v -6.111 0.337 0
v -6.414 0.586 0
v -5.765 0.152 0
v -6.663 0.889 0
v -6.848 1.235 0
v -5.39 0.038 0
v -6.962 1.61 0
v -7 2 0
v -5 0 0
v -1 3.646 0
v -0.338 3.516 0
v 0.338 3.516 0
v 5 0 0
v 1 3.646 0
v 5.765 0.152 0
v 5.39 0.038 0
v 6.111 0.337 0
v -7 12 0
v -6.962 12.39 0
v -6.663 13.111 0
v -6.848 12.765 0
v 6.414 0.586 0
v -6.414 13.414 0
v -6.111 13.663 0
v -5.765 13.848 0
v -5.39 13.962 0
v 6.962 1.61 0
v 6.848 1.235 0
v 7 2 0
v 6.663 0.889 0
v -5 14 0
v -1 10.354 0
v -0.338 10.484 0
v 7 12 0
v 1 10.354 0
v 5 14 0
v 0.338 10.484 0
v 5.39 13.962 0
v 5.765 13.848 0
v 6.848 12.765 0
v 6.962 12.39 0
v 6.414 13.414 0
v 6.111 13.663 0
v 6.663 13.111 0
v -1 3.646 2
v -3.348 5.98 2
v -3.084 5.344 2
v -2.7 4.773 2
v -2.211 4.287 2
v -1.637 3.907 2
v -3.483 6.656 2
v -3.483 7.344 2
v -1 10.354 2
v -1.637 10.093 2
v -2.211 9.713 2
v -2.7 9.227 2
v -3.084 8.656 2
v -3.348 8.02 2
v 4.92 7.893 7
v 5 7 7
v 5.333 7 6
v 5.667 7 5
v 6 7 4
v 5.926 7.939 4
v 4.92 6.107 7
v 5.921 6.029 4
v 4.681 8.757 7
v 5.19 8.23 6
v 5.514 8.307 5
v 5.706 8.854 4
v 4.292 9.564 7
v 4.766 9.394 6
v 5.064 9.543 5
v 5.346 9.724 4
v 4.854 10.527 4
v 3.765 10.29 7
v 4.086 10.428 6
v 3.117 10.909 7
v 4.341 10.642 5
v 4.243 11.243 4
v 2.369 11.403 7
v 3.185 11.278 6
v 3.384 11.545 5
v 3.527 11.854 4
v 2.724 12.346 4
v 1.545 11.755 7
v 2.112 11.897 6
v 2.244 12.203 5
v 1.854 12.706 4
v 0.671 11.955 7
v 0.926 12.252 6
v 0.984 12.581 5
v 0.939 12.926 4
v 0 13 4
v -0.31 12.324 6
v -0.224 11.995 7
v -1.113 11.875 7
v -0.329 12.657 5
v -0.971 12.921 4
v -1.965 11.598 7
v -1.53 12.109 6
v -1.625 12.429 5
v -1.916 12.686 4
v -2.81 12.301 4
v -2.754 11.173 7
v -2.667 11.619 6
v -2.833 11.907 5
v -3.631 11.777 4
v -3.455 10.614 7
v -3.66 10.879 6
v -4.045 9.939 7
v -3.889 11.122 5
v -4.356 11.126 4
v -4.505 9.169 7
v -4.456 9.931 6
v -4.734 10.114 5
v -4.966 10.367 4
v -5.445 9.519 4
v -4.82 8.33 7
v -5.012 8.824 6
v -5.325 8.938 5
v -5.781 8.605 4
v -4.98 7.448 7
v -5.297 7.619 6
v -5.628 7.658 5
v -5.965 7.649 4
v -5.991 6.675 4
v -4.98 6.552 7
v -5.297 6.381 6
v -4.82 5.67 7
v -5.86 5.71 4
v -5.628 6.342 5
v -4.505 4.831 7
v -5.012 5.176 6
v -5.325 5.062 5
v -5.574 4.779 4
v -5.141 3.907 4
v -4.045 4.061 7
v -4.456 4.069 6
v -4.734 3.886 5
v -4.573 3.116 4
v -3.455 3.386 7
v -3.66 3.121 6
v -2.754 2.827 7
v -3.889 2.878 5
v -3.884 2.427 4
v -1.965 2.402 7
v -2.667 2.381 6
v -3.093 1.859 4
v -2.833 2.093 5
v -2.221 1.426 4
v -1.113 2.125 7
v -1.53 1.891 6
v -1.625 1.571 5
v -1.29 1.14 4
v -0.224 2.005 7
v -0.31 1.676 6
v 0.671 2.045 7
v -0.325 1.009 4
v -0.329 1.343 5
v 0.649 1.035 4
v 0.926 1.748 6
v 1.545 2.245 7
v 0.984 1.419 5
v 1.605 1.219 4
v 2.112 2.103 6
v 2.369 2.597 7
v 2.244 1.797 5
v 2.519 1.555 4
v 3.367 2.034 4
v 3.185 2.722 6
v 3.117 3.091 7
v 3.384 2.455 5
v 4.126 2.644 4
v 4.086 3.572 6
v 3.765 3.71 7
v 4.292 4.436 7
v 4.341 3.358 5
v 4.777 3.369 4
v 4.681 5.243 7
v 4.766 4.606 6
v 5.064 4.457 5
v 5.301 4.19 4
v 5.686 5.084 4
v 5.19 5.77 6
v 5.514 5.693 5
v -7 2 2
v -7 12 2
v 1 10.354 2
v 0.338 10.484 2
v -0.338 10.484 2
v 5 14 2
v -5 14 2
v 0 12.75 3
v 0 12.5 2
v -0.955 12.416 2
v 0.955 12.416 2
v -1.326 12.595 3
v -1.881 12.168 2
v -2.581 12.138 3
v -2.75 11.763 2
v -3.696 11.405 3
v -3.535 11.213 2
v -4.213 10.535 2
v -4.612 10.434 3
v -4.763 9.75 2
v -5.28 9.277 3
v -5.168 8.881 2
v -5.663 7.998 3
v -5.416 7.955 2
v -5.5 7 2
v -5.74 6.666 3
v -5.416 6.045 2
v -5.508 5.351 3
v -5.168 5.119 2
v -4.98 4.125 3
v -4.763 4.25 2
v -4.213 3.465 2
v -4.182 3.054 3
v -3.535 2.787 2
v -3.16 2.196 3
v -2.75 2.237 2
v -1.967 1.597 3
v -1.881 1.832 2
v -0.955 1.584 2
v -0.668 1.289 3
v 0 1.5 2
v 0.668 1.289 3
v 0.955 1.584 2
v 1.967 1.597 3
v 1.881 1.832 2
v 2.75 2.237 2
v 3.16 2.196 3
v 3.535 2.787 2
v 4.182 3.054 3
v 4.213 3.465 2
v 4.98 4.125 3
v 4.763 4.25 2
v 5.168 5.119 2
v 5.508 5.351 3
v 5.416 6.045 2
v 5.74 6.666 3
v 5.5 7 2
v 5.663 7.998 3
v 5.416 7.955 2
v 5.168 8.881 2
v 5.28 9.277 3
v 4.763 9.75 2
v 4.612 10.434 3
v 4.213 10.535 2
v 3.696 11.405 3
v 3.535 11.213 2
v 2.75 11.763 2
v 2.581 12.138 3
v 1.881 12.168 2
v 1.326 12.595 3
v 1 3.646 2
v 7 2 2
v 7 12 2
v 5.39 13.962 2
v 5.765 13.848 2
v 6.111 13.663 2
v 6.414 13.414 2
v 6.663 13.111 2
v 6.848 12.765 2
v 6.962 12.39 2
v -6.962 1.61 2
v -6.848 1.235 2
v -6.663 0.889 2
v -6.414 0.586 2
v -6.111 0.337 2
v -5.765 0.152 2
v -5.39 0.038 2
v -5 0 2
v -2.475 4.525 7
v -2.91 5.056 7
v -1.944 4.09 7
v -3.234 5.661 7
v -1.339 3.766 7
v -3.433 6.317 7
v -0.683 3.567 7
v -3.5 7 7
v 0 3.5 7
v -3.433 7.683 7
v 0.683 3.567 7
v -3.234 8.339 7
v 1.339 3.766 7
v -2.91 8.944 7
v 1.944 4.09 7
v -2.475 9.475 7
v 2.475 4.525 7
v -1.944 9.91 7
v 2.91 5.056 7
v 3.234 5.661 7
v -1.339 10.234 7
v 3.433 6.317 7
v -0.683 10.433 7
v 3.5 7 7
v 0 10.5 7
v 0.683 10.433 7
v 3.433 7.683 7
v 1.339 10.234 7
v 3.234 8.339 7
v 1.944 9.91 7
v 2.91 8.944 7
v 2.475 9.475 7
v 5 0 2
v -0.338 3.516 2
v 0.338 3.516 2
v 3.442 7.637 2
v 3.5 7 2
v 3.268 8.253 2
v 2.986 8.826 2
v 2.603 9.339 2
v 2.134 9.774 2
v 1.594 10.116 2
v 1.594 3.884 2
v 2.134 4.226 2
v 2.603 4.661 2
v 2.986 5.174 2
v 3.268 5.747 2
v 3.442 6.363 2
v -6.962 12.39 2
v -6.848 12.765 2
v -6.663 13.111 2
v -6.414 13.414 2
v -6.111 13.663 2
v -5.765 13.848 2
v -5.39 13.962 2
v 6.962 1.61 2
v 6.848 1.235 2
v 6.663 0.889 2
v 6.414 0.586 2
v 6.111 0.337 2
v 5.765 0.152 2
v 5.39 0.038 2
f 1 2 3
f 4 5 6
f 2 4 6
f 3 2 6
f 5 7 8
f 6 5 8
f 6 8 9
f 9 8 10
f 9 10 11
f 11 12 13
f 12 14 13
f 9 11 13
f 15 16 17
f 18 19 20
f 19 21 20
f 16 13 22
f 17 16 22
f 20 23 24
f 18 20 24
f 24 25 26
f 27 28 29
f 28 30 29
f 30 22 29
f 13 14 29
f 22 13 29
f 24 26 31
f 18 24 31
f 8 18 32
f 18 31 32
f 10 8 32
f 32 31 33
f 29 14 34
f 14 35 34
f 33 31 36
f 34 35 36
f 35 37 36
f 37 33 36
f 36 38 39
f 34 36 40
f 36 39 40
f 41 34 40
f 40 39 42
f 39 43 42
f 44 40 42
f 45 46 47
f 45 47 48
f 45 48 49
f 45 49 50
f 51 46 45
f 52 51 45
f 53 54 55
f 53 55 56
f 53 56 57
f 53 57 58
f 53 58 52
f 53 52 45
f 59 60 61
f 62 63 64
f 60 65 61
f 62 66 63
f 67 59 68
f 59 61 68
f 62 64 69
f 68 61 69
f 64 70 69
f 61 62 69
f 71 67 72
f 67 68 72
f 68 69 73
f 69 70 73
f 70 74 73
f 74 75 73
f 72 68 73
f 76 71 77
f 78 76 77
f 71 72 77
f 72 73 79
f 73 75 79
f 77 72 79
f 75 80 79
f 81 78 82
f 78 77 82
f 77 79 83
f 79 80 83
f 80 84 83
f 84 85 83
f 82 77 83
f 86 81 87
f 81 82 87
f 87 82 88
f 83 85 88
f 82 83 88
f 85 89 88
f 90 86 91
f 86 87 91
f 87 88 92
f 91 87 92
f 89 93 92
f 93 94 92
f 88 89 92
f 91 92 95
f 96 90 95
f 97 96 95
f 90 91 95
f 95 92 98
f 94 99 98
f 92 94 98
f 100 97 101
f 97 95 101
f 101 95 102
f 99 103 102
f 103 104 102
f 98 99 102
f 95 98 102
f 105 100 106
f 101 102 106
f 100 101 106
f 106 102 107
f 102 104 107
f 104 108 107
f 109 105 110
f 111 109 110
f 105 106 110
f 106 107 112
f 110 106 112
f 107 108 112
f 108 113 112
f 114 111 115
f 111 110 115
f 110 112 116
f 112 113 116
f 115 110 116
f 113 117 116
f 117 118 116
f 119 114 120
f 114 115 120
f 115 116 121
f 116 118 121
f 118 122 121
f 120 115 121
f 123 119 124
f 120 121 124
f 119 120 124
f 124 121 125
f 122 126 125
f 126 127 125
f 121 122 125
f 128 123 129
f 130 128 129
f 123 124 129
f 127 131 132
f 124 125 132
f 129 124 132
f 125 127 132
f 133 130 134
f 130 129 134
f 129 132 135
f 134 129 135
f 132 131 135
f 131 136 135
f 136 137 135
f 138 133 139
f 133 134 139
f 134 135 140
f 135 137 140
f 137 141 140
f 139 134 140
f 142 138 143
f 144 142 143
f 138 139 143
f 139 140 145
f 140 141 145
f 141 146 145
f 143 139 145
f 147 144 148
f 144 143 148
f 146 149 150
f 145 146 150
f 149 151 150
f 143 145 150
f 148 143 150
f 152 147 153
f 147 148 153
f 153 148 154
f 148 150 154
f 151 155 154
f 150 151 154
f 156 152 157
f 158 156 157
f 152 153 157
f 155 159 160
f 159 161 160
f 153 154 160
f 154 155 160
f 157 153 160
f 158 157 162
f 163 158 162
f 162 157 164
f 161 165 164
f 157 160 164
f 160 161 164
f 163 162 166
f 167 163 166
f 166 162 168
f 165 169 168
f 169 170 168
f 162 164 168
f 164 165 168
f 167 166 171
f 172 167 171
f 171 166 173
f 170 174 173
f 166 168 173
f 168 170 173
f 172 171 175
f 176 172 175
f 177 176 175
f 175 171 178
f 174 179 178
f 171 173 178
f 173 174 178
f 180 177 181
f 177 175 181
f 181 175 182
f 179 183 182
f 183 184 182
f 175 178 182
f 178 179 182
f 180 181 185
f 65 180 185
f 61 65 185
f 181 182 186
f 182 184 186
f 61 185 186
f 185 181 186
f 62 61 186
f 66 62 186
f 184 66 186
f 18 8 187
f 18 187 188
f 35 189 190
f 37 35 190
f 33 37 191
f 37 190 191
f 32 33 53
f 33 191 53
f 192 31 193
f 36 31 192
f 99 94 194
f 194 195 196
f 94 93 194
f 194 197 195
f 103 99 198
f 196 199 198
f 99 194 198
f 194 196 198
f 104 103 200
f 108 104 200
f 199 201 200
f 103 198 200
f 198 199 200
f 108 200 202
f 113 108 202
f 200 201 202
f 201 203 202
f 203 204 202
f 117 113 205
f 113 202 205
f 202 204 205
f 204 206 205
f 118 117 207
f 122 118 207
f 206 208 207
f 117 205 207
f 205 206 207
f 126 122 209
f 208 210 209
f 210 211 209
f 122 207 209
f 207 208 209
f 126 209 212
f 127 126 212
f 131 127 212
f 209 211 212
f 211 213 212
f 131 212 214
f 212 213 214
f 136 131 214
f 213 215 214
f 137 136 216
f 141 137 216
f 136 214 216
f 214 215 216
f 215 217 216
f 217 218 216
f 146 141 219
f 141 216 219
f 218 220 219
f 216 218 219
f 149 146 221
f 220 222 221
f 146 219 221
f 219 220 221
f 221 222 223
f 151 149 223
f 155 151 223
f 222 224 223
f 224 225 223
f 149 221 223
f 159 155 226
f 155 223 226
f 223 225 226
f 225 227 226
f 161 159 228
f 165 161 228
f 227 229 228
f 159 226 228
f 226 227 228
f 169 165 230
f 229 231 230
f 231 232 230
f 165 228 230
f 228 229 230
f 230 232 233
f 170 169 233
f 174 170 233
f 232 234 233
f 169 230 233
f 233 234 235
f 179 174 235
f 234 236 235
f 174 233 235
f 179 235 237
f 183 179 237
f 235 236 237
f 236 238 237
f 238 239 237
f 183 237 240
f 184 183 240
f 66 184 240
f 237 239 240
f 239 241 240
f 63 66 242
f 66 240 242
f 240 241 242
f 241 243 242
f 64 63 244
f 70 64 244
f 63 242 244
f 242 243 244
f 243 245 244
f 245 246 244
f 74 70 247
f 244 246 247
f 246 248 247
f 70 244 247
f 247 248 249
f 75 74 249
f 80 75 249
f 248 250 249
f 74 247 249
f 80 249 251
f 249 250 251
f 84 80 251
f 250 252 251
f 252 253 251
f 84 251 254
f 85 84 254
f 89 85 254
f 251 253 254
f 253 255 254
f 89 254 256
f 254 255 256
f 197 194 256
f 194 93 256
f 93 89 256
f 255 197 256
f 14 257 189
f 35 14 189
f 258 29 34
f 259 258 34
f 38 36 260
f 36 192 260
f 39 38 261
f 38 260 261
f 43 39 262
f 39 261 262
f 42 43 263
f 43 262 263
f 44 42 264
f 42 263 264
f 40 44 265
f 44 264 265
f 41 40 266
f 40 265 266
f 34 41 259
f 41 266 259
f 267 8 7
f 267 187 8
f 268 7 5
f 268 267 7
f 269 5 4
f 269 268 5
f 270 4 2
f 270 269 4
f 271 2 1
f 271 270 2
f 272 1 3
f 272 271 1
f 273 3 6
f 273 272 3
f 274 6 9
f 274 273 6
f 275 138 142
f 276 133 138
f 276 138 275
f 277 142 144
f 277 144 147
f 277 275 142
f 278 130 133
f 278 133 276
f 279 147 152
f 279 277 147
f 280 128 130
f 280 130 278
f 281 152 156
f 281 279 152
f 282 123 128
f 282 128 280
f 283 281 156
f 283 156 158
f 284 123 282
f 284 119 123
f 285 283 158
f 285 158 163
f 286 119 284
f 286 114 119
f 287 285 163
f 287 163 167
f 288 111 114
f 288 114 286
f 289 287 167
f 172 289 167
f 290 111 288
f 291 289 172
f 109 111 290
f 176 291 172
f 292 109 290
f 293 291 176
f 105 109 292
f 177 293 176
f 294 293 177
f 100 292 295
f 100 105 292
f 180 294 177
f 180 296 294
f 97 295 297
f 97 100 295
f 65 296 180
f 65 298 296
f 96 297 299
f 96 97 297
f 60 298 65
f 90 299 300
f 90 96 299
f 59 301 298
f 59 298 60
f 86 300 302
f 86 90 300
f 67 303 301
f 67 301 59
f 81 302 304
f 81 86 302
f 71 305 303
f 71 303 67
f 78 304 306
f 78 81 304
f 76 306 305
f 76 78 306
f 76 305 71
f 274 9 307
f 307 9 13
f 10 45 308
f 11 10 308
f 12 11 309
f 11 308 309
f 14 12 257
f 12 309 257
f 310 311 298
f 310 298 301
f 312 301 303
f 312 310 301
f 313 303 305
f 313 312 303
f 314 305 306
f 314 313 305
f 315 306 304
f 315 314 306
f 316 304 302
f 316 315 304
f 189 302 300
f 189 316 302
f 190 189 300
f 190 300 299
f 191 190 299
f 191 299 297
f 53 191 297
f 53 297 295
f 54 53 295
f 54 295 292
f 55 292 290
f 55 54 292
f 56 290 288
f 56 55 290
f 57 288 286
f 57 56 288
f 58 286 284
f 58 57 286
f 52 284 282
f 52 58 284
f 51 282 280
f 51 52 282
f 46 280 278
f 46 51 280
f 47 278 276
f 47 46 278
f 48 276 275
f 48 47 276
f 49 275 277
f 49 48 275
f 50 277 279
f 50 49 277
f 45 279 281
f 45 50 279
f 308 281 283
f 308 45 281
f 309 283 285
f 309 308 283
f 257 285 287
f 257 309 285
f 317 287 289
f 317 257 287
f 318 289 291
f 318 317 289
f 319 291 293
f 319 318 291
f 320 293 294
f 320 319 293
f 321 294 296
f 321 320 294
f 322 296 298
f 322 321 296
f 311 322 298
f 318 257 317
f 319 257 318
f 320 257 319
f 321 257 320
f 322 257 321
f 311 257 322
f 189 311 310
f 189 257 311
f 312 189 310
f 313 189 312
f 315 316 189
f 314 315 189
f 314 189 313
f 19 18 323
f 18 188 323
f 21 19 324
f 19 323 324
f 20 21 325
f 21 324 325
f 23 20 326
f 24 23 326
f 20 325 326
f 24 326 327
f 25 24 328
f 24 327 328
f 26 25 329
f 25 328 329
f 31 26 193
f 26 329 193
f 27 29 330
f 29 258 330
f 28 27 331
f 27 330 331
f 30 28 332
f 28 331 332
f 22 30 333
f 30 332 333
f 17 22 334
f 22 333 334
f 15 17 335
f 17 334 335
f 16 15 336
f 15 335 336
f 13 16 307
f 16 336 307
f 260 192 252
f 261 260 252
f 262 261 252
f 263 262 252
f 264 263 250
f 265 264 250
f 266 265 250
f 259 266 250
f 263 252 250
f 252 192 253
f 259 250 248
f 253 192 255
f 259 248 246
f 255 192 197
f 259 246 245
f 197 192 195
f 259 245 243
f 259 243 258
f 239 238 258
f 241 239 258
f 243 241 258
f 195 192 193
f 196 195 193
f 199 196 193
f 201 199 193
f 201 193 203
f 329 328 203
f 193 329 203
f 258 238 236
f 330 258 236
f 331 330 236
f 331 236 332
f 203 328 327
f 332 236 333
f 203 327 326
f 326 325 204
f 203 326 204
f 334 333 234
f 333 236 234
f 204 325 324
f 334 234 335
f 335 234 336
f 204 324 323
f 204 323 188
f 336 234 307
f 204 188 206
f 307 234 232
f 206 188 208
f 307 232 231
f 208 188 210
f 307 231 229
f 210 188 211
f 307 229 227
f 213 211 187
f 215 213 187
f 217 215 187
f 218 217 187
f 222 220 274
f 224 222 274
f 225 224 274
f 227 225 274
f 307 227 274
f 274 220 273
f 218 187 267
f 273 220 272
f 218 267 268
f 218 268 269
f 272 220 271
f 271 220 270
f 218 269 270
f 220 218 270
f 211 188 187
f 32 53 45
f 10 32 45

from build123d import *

# Parameters (mm, degrees)
F0_W     = 14
F0_H     = 14
F1_DEPTH = 2
F2_R     = 6
F2_R_2   = 3.5
F3_DEPTH = 5
F4_SIZE2 = 3
F4_SIZE  = 1
F9_DEPTH = 2
F10_R    = 2


with BuildPart() as f1:
    # F0 (on Top) → F1 (new body)
    with BuildSketch(Plane.XY):
        with Locations((-7, 7)):
            Rectangle(F0_W, F0_H)
    extrude(amount=F1_DEPTH)

    # F2 (on face) → F3 (join)
    with BuildSketch(Plane.XY.offset(2)):
        with Locations((-7, 7)):
            Circle(F2_R)
        with Locations((-7, 7)):
            Circle(F2_R_2, mode=Mode.SUBTRACT)
    extrude(amount=F3_DEPTH)

    # F4
    f4_edges = [f1.edges().sort_by_distance(p)[0] for p in [
        (-13, 7, 7),
    ]]
    f4_side = f1.faces().sort_by_distance((-12.830294, 7, 7))[0]
    chamfer(f4_edges, length=F4_SIZE, length2=F4_SIZE2, reference=f4_side)


with BuildPart() as f1_1:
    # F5: moved
    add(f1.part.moved(Location((7, 0, 0))))

    # F6 (on Right) → F7 (revolve, cut)
    with BuildSketch(Plane.YZ):
        Polygon((13, 2), (13, 4), (12.5, 2), align=None)
    revolve(axis=Axis((0, 7, 22.9139531255), (0, 0, 1)), mode=Mode.SUBTRACT)

    # F8 (on face) → F9 (cut, through all)
    with BuildSketch(Plane.XY.offset(2)):
        with BuildLine():
            Line((1, 3.6458980338), (1, 10.3541019662))
            ThreePointArc((1, 10.3541019662), (0, 10.5), (-1, 10.3541019662))
            Line((-1, 10.3541019662), (-1, 3.6458980338))
            ThreePointArc((-1, 3.6458980338), (0, 3.5), (1, 3.6458980338))
        make_face()
    extrude(amount=-F9_DEPTH, mode=Mode.SUBTRACT)

    # F10
    f10_edges = [f1_1.edges().sort_by_distance(p)[0] for p in [
        (7, 0, 1),
        (7, 14, 1),
        (-7, 14, 1),
        (-7, 0, 1),
    ]]
    fillet(f10_edges, radius=F10_R)


solid = f1_1.part
